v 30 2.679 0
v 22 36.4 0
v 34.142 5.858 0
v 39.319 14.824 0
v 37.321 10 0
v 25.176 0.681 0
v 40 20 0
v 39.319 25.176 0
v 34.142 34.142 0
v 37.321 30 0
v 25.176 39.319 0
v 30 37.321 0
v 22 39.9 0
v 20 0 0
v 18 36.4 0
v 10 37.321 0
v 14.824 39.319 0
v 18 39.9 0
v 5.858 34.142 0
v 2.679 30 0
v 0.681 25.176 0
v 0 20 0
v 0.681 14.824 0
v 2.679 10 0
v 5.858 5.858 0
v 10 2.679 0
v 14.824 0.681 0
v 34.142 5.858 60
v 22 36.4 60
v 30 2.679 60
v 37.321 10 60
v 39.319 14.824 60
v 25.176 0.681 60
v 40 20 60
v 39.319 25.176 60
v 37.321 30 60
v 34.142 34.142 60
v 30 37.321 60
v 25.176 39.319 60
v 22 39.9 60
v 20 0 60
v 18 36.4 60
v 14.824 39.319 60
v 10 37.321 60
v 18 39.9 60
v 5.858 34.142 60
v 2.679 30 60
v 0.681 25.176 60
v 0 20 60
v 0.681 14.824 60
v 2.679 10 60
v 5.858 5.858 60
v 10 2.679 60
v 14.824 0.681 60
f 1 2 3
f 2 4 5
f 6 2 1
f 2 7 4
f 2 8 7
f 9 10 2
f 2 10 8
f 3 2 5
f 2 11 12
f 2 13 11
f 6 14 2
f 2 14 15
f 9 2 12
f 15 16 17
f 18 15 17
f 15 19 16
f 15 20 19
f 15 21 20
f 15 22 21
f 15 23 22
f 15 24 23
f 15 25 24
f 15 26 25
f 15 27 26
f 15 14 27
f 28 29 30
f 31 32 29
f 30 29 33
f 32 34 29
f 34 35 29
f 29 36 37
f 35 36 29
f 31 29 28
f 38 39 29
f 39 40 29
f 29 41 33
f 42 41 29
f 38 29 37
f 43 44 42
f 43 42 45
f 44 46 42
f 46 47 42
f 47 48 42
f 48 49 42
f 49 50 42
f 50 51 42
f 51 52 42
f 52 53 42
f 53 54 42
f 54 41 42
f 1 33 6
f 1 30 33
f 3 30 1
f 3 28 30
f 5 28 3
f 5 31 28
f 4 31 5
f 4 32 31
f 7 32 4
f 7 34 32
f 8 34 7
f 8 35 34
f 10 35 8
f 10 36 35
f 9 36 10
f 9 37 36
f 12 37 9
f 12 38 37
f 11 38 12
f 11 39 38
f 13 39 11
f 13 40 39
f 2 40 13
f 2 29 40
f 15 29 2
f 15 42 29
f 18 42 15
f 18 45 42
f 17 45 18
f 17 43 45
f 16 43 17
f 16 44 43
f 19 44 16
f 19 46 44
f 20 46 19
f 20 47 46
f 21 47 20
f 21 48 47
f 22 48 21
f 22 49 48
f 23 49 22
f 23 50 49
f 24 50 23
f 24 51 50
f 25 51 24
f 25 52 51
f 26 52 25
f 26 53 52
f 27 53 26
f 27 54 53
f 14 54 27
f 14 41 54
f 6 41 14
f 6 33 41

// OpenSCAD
$fn = 32;

// ----------------------------------------------------------------------
// Keyway shaft: d40 shaft, key 4 x 3.5 mm
// ----------------------------------------------------------------------

// --- parameters (mm) ---
shaft_r = 20;             // shaft radius
key_w = 4;                // keyway width
key_d = 3.5;              // keyway depth below the surface line
plate_t = 60;             // shaft length, Z (extrusion height)

shaft_d = 2 * shaft_r;  // shaft diameter
circle_step = 15;  // polygon sampling step, degrees

profile = [[14.824, 39.319], [10, 37.321], [5.858, 34.142], [2.679, 30], [0.681, 25.176], [0, 20], [0.681, 14.824], [2.679, 10], [5.858, 5.858], [10, 2.679], [14.824, 0.681], [20, 0], [25.176, 0.681], [30, 2.679], [34.142, 5.858], [37.321, 10], [39.319, 14.824], [40, 20], [39.319, 25.176], [37.321, 30], [34.142, 34.142], [30, 37.321], [25.176, 39.319], [22, 39.9], [22, 36.4], [18, 36.4], [18, 39.9]];  // primary outline, 27 points, counter clockwise

// --- the one profile operation ---
linear_extrude(height = plate_t) polygon(points = profile);
